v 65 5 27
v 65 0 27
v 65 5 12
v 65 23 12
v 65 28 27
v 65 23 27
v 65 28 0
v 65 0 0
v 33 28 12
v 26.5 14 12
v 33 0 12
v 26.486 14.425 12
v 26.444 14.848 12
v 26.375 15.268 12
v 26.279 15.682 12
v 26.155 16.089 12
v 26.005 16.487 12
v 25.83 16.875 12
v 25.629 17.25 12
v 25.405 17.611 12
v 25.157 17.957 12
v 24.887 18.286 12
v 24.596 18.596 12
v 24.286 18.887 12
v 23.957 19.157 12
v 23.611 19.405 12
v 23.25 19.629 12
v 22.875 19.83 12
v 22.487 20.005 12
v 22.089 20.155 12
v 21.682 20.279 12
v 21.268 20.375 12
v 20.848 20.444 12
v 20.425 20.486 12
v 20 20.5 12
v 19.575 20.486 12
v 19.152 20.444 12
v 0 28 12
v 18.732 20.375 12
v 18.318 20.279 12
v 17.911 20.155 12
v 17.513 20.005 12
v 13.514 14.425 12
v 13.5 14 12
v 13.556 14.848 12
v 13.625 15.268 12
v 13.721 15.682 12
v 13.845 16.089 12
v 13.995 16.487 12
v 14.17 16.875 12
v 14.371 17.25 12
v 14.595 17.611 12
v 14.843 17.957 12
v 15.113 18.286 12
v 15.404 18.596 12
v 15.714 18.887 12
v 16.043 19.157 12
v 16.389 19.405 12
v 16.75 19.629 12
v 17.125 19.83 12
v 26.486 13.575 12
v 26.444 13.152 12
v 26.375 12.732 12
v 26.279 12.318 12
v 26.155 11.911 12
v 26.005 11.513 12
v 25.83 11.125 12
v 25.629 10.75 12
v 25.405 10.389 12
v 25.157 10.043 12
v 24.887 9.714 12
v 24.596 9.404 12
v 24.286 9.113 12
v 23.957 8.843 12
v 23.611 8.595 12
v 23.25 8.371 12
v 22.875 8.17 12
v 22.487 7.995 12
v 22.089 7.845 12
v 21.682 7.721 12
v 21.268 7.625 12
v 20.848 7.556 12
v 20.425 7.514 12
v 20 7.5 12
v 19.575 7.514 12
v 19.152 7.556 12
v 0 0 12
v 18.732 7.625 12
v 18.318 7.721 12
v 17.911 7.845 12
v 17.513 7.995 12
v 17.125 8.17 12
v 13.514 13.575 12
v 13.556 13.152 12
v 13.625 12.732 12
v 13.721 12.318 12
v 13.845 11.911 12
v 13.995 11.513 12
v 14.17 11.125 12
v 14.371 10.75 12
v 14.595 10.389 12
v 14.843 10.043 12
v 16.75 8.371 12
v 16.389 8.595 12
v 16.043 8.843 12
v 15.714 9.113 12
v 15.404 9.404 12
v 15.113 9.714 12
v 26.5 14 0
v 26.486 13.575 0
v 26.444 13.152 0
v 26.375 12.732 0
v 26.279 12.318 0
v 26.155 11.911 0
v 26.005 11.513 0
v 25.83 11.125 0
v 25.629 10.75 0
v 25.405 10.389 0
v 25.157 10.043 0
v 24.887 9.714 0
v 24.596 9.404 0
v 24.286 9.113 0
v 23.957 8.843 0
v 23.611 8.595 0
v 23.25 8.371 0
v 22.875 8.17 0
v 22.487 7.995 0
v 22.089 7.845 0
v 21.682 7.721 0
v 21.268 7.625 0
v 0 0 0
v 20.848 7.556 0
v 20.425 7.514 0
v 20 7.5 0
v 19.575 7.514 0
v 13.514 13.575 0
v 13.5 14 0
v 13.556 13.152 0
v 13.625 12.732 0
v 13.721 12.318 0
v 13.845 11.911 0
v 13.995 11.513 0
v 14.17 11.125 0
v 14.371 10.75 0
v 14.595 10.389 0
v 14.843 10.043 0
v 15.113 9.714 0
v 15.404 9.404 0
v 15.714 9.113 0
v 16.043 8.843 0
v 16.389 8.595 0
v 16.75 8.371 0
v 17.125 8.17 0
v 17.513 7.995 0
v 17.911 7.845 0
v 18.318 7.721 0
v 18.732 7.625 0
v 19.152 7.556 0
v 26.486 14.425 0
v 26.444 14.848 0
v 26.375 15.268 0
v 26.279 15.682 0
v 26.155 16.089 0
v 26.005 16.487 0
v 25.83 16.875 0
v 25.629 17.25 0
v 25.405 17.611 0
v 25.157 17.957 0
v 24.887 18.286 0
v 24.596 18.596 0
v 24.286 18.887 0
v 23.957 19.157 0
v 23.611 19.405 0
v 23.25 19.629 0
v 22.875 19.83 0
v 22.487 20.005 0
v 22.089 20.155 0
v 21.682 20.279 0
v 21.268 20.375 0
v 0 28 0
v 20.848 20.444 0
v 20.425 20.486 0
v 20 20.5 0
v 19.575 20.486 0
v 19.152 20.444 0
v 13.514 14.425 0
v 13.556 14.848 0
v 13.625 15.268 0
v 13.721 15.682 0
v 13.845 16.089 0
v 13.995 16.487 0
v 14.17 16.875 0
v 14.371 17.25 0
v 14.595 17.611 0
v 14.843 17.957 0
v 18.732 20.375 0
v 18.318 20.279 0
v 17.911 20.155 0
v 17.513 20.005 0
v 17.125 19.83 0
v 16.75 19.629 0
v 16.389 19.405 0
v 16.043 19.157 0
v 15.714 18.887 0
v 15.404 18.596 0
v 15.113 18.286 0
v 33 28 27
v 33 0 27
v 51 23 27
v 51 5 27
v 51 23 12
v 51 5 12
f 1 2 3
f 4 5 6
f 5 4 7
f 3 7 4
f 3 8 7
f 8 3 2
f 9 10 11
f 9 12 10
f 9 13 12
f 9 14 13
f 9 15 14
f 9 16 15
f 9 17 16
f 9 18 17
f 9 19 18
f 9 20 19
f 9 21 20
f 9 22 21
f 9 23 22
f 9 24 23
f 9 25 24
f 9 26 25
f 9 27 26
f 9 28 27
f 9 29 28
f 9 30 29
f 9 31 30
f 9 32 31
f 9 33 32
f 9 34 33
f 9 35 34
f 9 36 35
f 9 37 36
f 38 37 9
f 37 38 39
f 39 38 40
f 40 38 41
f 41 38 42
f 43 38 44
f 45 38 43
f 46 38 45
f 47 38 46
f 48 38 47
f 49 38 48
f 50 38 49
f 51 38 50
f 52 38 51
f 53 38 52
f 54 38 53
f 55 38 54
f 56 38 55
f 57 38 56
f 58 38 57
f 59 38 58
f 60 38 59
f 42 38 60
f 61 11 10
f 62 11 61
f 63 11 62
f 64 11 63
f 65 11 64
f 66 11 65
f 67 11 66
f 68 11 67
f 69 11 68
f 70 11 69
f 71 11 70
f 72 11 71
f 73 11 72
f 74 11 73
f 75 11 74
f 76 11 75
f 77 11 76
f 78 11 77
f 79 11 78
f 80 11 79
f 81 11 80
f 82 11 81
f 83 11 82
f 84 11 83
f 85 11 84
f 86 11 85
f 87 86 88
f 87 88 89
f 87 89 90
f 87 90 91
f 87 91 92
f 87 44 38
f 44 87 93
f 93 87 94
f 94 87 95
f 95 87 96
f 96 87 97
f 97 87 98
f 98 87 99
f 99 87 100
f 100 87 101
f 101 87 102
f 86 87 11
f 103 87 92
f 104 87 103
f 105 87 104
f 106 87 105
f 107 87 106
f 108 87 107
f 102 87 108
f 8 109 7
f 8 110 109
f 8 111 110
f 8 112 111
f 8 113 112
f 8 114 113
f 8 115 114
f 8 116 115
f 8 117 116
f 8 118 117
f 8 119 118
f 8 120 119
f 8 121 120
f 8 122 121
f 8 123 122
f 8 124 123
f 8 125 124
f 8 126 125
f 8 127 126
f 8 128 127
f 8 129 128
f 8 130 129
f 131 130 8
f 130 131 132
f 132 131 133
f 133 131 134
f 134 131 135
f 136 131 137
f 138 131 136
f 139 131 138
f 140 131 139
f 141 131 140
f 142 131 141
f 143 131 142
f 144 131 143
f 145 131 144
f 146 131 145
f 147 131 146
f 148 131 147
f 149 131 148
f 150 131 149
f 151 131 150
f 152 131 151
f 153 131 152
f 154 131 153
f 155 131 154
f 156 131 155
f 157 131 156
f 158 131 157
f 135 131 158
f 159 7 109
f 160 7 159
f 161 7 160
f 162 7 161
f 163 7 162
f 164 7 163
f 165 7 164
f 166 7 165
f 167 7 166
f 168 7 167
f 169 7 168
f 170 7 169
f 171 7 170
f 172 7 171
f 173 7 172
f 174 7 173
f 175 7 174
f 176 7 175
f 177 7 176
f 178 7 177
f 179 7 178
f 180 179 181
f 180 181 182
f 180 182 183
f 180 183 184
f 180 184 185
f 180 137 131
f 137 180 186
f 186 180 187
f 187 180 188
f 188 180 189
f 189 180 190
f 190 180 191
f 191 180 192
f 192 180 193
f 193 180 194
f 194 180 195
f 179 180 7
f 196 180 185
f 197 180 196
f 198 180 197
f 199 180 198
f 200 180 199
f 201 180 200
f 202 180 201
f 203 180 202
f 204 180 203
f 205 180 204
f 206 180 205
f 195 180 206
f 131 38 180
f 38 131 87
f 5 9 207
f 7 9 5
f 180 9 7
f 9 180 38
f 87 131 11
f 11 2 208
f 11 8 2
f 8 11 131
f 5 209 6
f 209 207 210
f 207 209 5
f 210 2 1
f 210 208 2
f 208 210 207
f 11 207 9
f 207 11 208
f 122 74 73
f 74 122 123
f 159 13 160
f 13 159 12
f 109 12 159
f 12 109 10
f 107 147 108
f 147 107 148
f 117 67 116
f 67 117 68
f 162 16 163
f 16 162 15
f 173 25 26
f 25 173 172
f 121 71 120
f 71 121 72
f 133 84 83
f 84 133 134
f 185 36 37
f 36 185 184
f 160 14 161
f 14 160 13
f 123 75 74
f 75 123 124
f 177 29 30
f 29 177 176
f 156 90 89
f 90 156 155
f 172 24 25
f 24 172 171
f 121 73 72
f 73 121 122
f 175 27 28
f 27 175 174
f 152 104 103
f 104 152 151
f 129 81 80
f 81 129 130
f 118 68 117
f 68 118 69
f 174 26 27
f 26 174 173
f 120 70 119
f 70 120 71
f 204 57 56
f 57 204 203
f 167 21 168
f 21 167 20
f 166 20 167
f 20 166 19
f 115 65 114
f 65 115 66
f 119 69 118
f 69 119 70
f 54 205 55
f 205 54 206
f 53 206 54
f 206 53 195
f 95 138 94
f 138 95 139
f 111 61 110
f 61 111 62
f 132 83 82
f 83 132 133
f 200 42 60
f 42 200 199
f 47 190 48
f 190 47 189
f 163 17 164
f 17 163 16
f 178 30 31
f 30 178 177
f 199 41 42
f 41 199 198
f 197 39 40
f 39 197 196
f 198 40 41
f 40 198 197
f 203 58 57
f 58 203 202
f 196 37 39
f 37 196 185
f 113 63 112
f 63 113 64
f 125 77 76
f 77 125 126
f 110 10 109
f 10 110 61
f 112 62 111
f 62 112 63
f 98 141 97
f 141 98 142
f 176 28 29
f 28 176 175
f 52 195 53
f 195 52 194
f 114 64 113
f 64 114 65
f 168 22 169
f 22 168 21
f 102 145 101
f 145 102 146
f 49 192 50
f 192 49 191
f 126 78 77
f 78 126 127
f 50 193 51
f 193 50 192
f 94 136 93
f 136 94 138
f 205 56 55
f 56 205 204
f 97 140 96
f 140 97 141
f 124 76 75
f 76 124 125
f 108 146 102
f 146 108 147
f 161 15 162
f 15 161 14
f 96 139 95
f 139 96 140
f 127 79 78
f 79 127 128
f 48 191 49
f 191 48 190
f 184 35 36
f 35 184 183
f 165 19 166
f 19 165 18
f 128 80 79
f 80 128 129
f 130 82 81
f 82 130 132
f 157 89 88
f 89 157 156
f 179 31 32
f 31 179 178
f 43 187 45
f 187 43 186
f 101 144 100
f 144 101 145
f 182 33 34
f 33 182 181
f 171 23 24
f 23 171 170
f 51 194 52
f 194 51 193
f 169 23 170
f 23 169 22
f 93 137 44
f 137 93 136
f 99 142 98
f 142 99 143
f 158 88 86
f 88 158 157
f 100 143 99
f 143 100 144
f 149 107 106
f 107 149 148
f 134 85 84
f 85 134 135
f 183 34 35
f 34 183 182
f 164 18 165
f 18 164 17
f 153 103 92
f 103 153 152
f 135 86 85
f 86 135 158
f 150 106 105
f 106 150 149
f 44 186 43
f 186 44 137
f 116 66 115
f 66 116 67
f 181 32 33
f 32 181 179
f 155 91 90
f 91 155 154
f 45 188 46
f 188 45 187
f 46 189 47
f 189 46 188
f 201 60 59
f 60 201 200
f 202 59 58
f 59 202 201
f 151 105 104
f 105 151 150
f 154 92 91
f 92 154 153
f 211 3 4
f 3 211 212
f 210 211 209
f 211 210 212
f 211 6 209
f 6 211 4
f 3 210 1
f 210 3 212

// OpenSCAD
// ================================================
// Gá chạc lỗ tròn
// Đơn vị: mm  (X = dài, Y = rộng, Z = cao)
// Tạo tự động từ dữ liệu hình học của AI
// ================================================

module object_3d() {
    difference() {
        union() {
            translate([0, 0, 0]) cube([65, 28, 12]);
            translate([33, 0, 12]) cube([32, 28, 15]);
        }
        translate([20, 14, -1]) cylinder(r=6.5, h=14, $fn=96);
        translate([51, 5, 12]) cube([15, 18, 16]);
    }
}

object_3d();
